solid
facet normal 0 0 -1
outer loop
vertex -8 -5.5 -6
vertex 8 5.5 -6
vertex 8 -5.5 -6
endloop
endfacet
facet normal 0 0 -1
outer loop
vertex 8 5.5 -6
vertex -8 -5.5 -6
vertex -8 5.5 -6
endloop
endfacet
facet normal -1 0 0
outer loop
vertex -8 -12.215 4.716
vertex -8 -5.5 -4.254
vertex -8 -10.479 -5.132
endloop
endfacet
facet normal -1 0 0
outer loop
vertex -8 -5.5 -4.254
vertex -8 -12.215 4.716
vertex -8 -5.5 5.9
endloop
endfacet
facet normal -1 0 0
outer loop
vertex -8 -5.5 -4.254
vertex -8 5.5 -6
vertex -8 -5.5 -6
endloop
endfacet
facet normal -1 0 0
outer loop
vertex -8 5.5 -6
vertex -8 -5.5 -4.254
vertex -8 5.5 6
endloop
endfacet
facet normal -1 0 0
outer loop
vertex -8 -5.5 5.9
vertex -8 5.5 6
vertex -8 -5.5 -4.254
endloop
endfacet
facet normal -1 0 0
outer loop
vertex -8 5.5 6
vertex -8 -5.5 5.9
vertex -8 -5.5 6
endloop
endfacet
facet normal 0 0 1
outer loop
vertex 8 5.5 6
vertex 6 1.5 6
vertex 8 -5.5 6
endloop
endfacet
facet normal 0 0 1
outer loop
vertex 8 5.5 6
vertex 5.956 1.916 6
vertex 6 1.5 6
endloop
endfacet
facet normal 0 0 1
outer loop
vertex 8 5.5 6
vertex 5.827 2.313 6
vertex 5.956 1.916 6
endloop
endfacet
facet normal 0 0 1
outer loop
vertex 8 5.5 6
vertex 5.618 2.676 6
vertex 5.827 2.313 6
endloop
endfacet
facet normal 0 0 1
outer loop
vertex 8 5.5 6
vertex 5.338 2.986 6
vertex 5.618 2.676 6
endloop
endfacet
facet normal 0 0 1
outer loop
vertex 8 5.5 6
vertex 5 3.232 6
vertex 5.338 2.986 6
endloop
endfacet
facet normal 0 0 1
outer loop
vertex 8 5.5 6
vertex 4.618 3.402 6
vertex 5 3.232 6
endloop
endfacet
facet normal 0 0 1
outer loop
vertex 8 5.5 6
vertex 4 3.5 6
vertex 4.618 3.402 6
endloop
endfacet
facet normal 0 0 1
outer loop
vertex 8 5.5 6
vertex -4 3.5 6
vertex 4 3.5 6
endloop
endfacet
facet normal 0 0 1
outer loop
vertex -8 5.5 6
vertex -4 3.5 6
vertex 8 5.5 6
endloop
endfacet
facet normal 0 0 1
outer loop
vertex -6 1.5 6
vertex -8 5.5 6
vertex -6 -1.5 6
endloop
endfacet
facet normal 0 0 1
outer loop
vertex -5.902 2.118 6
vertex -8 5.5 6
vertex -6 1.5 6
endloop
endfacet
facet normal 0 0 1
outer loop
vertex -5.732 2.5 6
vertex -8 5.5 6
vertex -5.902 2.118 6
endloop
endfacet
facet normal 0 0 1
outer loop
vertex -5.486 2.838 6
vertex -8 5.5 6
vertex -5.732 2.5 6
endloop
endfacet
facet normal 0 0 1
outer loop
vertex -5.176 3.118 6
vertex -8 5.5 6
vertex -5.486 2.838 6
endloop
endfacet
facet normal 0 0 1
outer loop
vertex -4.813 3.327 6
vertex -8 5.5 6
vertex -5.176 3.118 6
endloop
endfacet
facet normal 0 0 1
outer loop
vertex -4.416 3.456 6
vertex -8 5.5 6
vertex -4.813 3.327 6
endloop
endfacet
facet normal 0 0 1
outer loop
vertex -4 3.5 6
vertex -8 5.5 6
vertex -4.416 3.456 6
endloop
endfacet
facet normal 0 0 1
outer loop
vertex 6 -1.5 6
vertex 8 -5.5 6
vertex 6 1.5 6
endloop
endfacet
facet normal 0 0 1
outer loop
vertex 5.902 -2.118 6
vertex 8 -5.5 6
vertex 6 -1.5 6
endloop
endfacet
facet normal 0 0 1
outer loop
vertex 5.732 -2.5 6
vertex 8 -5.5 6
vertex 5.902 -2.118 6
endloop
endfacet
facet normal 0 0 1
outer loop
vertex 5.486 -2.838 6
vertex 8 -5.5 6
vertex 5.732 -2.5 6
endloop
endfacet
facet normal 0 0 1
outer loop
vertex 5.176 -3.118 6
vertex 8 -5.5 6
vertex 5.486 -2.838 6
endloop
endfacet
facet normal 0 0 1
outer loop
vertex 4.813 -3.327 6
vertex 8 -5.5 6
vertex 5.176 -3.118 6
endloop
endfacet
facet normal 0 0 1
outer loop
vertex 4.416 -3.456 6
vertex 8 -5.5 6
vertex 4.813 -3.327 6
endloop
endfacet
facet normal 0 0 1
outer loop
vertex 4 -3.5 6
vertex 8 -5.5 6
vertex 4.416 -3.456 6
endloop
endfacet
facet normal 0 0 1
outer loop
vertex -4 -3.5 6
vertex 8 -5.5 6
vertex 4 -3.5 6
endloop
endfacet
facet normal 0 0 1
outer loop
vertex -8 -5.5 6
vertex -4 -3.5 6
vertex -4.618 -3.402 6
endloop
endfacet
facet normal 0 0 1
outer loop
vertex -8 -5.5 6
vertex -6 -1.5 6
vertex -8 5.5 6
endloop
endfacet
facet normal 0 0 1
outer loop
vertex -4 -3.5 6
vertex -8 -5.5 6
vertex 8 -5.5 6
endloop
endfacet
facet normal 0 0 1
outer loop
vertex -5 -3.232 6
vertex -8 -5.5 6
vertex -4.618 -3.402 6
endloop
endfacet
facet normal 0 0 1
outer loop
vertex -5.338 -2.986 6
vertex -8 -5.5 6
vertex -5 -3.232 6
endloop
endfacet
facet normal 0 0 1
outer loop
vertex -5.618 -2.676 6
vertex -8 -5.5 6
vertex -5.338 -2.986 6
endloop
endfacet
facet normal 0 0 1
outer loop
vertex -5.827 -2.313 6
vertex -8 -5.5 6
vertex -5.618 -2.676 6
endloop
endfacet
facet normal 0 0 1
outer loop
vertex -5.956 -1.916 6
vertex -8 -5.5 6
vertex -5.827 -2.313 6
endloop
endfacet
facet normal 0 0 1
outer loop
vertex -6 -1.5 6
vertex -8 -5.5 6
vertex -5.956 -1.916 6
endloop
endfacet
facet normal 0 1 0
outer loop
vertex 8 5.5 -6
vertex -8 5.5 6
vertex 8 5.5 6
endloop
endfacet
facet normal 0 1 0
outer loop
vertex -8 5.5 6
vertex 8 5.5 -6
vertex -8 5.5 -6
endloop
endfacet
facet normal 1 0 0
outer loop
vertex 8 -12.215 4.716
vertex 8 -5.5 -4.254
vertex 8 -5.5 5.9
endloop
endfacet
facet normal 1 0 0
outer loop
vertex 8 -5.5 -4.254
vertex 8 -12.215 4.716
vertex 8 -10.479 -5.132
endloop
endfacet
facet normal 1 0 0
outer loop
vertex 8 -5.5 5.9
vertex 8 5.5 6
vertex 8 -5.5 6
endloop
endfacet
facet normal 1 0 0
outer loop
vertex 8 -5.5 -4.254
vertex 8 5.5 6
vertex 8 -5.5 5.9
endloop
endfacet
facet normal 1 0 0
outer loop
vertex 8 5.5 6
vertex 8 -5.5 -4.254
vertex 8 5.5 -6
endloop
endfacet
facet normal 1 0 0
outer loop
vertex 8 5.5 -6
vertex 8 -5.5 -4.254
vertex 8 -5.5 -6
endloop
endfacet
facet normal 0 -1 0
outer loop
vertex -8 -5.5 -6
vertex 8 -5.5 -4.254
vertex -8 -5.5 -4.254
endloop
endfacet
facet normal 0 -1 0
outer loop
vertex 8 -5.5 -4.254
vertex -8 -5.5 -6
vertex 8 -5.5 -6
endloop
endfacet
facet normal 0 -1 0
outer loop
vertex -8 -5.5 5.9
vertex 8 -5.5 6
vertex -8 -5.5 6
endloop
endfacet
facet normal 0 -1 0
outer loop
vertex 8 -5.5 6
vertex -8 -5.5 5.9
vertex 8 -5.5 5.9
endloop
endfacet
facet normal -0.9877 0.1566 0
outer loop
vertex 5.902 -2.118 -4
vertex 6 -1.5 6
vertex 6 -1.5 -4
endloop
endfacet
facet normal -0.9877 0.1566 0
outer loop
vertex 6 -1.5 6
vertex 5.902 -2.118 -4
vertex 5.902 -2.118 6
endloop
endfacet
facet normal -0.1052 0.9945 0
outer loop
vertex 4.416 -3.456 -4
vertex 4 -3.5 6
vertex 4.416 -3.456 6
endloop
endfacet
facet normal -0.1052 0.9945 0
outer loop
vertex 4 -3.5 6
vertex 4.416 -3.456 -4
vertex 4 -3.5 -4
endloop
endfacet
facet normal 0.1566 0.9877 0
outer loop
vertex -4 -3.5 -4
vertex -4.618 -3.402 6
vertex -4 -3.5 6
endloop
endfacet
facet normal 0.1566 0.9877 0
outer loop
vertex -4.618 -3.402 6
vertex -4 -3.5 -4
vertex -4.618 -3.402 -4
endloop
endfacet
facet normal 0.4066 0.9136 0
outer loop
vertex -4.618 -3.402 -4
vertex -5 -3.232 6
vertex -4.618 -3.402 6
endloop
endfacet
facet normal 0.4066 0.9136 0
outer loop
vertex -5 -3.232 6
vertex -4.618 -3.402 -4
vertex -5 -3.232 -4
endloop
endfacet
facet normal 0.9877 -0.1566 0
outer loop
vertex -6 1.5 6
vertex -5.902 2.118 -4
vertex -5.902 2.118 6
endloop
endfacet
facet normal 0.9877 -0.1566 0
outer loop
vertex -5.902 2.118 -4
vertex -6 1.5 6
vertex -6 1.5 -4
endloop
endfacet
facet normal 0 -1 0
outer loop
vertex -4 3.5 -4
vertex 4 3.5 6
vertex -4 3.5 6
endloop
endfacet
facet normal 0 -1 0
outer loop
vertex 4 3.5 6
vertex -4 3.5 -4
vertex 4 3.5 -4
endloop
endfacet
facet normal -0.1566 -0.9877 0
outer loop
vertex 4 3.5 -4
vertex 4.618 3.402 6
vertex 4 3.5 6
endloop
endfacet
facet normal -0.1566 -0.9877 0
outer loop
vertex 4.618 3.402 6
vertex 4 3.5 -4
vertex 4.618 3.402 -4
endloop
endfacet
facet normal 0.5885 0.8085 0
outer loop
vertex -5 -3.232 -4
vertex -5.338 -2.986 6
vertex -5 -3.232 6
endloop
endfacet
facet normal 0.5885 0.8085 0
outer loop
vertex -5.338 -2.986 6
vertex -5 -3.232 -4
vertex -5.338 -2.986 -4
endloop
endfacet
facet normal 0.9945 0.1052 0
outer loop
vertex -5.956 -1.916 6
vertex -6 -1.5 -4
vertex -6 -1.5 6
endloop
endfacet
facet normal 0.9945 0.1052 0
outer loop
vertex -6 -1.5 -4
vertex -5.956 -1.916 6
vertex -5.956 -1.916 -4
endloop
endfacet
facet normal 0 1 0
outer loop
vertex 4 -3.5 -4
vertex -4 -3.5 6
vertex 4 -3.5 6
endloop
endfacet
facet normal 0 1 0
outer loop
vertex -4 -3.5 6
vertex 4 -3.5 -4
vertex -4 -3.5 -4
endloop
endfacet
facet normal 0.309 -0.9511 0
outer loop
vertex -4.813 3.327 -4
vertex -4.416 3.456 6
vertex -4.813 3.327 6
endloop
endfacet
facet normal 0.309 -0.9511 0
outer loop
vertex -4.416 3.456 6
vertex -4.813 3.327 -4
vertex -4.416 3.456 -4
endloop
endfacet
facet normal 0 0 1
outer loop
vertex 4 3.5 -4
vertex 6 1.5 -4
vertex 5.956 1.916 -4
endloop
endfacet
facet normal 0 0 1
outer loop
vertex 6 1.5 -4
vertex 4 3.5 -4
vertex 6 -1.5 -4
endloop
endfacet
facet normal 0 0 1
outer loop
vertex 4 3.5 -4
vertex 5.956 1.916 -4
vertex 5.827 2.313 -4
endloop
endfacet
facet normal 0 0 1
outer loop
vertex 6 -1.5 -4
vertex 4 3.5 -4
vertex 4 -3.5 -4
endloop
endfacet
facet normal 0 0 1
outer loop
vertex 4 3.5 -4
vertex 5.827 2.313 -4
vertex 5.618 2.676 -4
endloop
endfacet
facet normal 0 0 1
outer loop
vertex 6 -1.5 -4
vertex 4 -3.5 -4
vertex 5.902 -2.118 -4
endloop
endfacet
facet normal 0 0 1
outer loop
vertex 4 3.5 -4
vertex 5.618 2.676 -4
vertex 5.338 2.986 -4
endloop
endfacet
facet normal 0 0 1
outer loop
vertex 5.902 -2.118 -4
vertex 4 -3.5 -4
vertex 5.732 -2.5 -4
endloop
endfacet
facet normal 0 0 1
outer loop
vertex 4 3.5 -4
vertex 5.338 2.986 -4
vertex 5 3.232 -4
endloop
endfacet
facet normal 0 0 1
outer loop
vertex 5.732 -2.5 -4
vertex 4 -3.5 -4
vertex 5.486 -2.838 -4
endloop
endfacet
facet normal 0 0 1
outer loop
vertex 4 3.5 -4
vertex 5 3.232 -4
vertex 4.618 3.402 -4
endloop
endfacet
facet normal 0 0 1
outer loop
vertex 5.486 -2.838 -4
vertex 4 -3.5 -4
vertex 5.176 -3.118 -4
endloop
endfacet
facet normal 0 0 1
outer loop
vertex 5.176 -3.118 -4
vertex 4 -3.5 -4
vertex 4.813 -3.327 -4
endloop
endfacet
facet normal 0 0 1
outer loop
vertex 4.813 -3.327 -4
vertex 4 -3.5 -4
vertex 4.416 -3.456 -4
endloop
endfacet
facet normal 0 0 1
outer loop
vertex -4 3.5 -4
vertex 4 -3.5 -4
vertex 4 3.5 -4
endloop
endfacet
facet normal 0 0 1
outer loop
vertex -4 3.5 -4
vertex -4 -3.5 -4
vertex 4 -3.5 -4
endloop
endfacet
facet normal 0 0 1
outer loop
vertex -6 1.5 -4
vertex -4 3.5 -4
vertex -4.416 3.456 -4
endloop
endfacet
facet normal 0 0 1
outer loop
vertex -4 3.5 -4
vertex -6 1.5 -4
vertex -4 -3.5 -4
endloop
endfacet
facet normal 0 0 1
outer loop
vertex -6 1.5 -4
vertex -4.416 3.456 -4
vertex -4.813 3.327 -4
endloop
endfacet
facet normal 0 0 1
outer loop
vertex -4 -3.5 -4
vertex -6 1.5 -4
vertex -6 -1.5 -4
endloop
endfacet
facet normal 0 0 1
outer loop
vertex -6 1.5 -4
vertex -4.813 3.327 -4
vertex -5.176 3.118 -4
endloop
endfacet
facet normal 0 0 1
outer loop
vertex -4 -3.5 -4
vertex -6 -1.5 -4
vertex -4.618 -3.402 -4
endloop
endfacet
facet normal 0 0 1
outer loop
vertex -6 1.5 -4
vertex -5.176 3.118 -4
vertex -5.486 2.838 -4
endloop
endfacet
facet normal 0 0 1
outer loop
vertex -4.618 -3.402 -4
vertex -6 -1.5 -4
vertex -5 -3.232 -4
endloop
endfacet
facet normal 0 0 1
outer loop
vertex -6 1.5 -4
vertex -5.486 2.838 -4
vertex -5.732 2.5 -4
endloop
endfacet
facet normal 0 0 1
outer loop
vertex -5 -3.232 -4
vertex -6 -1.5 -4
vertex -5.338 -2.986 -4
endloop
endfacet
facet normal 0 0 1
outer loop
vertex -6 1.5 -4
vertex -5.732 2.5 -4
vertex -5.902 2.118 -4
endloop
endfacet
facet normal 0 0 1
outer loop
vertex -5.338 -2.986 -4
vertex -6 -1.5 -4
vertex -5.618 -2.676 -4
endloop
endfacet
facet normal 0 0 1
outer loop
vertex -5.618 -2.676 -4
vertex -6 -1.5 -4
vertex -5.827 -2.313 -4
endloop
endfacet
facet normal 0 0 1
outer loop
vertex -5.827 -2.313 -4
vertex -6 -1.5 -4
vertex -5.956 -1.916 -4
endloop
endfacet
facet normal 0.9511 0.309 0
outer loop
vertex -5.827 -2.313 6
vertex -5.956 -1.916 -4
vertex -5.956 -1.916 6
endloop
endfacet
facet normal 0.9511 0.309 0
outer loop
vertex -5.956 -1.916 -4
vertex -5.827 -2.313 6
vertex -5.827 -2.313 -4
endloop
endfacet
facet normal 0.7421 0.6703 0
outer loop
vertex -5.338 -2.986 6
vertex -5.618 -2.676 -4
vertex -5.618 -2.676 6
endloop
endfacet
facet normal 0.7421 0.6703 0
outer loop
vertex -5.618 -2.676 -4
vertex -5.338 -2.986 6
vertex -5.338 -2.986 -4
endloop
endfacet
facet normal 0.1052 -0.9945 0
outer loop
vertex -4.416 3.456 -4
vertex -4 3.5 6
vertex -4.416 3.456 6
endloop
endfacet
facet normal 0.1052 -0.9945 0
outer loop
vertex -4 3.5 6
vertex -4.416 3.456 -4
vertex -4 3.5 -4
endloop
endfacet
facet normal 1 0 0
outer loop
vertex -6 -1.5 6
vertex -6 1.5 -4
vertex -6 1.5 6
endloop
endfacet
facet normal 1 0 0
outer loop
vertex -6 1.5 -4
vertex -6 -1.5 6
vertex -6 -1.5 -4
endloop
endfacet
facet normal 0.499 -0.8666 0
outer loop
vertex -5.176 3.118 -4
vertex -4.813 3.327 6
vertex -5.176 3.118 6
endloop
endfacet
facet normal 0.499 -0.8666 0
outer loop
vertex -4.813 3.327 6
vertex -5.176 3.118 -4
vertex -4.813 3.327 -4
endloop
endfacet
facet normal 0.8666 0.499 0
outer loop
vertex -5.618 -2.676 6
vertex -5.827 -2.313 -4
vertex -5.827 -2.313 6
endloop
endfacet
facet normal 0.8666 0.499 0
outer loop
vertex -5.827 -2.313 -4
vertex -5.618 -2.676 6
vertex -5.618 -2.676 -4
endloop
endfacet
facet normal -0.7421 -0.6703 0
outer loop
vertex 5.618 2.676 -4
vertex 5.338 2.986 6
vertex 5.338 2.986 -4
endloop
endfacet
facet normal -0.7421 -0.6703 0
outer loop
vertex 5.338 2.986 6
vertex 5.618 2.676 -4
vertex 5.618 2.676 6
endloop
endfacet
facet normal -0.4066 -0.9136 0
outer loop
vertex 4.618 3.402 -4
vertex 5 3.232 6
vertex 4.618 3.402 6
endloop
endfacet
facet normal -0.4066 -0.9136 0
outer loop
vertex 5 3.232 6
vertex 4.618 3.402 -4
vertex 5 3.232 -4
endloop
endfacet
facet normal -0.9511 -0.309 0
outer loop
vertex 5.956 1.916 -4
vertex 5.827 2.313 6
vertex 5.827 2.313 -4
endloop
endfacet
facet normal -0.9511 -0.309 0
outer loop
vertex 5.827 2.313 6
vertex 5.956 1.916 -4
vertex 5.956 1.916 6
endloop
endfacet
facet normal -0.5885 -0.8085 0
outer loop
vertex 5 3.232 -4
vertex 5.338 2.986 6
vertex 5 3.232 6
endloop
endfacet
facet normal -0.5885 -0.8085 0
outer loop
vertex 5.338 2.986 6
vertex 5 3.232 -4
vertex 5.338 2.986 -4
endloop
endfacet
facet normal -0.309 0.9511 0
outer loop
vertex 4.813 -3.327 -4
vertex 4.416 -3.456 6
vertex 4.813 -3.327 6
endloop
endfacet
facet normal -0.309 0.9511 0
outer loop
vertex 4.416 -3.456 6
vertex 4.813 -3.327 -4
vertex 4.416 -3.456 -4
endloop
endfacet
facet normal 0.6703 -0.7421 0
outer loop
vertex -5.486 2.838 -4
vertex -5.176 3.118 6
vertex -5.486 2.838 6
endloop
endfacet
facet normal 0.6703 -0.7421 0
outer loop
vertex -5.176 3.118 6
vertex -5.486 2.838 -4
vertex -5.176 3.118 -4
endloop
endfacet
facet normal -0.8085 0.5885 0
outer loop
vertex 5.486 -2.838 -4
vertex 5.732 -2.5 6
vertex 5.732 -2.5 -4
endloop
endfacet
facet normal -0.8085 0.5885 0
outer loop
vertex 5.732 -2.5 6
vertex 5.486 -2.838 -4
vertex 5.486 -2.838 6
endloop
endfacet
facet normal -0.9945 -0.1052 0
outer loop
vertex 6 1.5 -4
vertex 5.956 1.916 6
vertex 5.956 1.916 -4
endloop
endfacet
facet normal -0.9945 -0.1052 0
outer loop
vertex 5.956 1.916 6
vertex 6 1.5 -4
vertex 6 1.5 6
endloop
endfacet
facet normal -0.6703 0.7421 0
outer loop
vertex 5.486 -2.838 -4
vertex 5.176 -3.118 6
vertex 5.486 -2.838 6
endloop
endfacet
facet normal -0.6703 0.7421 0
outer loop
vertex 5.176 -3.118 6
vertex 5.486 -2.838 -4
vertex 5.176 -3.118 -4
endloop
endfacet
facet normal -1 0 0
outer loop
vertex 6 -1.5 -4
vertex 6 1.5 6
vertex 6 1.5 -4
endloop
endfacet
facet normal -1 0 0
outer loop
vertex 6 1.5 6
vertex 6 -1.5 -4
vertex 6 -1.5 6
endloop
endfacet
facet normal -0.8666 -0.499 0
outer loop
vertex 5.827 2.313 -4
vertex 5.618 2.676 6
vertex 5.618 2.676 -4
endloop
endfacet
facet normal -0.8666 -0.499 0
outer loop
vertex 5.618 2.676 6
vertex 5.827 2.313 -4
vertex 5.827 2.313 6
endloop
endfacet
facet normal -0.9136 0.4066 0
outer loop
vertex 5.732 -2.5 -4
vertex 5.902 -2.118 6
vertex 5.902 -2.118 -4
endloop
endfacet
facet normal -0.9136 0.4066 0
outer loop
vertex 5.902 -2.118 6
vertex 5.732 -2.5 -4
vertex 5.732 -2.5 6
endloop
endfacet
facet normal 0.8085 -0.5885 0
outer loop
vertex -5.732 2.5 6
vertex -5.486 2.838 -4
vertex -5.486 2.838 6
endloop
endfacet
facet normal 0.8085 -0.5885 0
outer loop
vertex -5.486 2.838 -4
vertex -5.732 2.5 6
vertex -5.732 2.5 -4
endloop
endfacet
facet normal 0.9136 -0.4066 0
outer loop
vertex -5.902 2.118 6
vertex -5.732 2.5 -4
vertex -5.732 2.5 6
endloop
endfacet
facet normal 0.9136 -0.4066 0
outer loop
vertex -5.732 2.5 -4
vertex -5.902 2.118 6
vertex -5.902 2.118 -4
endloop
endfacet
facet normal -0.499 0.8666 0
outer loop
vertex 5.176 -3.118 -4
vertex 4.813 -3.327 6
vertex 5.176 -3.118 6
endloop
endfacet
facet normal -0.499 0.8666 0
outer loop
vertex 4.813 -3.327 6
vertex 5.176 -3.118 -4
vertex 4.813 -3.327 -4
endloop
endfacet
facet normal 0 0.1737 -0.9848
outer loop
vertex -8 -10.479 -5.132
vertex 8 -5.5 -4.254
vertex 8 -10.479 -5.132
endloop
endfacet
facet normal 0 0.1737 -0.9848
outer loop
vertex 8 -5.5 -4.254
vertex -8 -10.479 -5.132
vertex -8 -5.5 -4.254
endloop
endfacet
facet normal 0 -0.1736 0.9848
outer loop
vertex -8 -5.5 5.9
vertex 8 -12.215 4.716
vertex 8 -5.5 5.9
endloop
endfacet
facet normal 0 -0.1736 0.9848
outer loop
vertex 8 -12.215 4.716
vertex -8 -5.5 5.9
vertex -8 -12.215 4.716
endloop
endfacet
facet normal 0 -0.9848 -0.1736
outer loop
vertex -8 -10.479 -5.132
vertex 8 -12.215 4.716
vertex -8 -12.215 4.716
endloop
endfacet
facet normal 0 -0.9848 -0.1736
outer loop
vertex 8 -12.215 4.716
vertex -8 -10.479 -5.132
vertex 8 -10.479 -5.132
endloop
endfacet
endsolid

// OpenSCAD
use <myTools.scad>
$fn=50;
SD=[12, 7, 10];

color("BLUE", .9)
abox(SD, +2, round_in=2, bCentered = true);  // 

color("RED")
translate([ 0, -7.9, .4])
rotate([ 10, 0, 0 ])
cube([SD.x + 4, SD.y, SD.z], true);  // 
